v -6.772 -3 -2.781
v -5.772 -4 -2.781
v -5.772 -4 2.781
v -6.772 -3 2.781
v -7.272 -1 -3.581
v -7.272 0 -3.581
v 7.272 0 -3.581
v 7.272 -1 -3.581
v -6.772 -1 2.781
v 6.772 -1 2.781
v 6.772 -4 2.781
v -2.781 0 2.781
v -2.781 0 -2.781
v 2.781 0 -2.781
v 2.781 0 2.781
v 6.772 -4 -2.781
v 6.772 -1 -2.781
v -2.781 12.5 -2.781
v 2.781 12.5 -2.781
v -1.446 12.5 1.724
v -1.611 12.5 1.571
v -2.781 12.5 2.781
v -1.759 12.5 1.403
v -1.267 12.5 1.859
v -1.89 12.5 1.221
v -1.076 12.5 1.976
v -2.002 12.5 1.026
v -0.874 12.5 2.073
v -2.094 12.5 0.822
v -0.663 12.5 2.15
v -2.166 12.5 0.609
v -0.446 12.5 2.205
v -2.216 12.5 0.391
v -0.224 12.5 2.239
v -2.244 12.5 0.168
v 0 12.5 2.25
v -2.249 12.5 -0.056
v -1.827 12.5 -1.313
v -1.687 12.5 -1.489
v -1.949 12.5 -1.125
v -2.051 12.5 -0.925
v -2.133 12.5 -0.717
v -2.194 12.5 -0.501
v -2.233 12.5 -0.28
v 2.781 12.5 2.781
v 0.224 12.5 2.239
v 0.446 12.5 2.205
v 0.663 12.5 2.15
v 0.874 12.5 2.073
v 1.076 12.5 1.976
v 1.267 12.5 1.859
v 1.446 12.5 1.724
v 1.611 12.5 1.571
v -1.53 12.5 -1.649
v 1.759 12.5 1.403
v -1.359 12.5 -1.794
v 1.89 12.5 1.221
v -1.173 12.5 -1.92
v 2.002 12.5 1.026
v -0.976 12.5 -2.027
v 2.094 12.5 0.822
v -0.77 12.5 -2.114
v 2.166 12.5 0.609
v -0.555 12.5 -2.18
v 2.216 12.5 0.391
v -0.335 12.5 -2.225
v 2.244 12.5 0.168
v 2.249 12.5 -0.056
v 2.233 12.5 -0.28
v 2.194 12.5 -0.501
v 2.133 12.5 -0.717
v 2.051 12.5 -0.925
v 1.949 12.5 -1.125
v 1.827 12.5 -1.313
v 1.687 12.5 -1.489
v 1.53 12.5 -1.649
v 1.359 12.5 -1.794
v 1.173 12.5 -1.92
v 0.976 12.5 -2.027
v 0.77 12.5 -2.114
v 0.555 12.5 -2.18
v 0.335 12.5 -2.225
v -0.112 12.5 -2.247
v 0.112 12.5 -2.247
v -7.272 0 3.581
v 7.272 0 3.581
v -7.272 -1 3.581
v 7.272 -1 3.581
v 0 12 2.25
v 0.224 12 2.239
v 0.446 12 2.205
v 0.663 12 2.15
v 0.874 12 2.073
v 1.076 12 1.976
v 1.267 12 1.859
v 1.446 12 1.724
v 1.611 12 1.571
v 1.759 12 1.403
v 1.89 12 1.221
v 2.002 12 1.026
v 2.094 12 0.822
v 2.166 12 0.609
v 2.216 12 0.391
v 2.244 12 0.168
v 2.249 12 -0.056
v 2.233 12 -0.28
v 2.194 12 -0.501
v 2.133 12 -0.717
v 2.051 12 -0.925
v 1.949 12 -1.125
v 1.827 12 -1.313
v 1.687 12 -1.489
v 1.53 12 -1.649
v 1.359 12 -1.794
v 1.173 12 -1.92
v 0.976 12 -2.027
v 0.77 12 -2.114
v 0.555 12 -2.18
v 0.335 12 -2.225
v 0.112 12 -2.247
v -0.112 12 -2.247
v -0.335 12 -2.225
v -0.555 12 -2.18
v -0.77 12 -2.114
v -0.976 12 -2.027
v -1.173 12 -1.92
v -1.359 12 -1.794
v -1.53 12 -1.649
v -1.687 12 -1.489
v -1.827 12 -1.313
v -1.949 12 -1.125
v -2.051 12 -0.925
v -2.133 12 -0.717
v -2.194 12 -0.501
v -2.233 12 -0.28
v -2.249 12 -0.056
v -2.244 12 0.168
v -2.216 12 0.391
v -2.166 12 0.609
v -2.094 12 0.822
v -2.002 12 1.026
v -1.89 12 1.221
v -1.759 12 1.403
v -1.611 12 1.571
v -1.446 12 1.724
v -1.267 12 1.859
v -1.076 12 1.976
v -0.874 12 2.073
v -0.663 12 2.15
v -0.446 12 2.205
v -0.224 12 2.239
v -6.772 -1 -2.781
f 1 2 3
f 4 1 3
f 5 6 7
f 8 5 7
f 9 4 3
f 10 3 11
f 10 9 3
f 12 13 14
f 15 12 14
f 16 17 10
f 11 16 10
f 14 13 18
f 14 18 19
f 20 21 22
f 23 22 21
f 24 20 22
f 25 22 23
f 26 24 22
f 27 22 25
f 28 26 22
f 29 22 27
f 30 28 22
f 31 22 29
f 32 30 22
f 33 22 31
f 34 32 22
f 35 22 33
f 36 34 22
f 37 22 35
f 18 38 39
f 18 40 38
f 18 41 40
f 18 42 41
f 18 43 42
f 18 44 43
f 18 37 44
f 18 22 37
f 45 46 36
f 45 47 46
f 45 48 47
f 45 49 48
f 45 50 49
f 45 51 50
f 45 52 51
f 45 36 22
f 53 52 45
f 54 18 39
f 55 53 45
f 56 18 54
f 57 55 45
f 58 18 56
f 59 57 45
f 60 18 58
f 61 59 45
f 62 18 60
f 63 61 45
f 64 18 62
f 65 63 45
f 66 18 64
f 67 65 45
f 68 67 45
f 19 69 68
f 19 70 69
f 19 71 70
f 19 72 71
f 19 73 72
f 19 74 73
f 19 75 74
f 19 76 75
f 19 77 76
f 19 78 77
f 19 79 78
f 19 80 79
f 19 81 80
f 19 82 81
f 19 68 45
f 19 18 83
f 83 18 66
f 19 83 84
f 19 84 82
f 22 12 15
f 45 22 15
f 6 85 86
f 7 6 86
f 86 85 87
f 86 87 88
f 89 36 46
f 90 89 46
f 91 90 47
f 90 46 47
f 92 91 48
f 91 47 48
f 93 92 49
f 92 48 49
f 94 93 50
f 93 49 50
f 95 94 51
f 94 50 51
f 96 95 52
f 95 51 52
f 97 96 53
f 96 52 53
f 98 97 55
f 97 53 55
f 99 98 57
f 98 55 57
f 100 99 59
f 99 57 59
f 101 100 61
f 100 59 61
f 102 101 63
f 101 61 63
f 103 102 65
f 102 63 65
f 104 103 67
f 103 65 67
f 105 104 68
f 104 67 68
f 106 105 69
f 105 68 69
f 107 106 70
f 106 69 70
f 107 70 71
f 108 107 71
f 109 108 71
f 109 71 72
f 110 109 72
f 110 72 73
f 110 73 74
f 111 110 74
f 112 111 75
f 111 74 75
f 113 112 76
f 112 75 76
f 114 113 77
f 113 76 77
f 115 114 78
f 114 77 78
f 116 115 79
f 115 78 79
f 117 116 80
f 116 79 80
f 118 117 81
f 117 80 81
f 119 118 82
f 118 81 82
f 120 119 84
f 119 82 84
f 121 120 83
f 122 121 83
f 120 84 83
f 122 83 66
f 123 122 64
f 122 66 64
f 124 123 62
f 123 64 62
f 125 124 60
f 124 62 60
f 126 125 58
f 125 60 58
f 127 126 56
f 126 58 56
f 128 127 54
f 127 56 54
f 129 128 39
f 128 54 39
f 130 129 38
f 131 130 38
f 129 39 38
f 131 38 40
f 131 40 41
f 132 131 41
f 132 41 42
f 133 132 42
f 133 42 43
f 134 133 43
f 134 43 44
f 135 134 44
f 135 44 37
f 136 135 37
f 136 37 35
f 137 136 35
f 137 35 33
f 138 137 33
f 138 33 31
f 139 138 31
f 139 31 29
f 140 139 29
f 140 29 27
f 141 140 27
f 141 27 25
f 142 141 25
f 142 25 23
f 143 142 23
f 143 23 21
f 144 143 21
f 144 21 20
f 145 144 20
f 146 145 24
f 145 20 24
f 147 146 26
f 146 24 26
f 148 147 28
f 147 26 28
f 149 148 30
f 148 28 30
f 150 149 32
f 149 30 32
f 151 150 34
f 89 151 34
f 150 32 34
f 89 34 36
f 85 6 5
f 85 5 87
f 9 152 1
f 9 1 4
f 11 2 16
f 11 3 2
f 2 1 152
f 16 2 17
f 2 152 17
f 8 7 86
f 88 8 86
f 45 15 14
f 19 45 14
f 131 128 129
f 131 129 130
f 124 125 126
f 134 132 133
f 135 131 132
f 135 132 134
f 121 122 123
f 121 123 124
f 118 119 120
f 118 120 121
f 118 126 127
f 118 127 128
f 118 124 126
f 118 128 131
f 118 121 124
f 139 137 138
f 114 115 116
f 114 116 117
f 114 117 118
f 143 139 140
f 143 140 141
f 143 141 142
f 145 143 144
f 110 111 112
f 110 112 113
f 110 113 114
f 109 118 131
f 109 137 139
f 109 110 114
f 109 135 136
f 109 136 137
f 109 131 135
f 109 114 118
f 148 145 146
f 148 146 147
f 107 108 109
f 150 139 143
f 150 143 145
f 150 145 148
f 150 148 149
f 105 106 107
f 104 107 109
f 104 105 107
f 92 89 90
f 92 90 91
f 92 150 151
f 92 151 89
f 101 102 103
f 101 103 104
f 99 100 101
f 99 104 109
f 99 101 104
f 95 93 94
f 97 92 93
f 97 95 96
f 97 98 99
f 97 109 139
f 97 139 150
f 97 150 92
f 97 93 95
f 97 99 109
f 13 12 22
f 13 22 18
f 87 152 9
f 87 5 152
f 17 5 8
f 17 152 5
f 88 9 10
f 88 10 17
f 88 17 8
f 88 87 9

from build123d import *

# Parameters (mm, degrees)
SKETCH_1_W          = 5.562046036
SKETCH_1_H          = 5.562046036
EXTRUDE_2_DEPTH     = 12.5
SKETCH_5_R          = 2.25
CUT_EXTRUDE_2_DEPTH = 0.5
SKETCH_6_W          = 14.543974178
SKETCH_6_H          = 7.162046036
EXTRUDE_3_DEPTH     = 1
SKETCH_7_W          = 13.543974178
SKETCH_7_H          = 5.562046036
EXTRUDE_4_DEPTH     = 3
CHAMFER_2_SIZE      = 1


with BuildPart() as part:
    # Эскиз1 → Бобышка-Вытянуть2 (new body)
    with BuildSketch(Plane(origin=(0, 0, 0), x_dir=(1, 0, 0), z_dir=(0, 1, 0))):
        Rectangle(SKETCH_1_W, SKETCH_1_H)
    extrude(amount=EXTRUDE_2_DEPTH)

    # Эскиз5 → Вырез-Вытянуть2 (cut)
    with BuildSketch(Plane(origin=(0, 12.5, 0), x_dir=(1, 0, 0), z_dir=(0, 1, 0))):
        with Locations(Location((0, 0, 0), (0, 0, 270))):
            Circle(SKETCH_5_R)
    extrude(amount=-CUT_EXTRUDE_2_DEPTH, mode=Mode.SUBTRACT)


with BuildPart() as body_2:
    # Эскиз6 → Бобышка-Вытянуть3 (new body)
    with BuildSketch(Plane.XZ):
        Rectangle(SKETCH_6_W, SKETCH_6_H)
    extrude(amount=EXTRUDE_3_DEPTH)

    # Эскиз7 → Бобышка-Вытянуть4 (add)
    with BuildSketch(Plane.XZ.offset(1)):
        Rectangle(SKETCH_7_W, SKETCH_7_H)
    extrude(amount=EXTRUDE_4_DEPTH)

    # Фаска2
    chamfer_2_edges = [body_2.edges().sort_by_distance(p)[0] for p in [
        (-6.771987089, -4, 0),
    ]]
    chamfer(chamfer_2_edges, length=CHAMFER_2_SIZE)


solid = Compound([part.part, body_2.part])
